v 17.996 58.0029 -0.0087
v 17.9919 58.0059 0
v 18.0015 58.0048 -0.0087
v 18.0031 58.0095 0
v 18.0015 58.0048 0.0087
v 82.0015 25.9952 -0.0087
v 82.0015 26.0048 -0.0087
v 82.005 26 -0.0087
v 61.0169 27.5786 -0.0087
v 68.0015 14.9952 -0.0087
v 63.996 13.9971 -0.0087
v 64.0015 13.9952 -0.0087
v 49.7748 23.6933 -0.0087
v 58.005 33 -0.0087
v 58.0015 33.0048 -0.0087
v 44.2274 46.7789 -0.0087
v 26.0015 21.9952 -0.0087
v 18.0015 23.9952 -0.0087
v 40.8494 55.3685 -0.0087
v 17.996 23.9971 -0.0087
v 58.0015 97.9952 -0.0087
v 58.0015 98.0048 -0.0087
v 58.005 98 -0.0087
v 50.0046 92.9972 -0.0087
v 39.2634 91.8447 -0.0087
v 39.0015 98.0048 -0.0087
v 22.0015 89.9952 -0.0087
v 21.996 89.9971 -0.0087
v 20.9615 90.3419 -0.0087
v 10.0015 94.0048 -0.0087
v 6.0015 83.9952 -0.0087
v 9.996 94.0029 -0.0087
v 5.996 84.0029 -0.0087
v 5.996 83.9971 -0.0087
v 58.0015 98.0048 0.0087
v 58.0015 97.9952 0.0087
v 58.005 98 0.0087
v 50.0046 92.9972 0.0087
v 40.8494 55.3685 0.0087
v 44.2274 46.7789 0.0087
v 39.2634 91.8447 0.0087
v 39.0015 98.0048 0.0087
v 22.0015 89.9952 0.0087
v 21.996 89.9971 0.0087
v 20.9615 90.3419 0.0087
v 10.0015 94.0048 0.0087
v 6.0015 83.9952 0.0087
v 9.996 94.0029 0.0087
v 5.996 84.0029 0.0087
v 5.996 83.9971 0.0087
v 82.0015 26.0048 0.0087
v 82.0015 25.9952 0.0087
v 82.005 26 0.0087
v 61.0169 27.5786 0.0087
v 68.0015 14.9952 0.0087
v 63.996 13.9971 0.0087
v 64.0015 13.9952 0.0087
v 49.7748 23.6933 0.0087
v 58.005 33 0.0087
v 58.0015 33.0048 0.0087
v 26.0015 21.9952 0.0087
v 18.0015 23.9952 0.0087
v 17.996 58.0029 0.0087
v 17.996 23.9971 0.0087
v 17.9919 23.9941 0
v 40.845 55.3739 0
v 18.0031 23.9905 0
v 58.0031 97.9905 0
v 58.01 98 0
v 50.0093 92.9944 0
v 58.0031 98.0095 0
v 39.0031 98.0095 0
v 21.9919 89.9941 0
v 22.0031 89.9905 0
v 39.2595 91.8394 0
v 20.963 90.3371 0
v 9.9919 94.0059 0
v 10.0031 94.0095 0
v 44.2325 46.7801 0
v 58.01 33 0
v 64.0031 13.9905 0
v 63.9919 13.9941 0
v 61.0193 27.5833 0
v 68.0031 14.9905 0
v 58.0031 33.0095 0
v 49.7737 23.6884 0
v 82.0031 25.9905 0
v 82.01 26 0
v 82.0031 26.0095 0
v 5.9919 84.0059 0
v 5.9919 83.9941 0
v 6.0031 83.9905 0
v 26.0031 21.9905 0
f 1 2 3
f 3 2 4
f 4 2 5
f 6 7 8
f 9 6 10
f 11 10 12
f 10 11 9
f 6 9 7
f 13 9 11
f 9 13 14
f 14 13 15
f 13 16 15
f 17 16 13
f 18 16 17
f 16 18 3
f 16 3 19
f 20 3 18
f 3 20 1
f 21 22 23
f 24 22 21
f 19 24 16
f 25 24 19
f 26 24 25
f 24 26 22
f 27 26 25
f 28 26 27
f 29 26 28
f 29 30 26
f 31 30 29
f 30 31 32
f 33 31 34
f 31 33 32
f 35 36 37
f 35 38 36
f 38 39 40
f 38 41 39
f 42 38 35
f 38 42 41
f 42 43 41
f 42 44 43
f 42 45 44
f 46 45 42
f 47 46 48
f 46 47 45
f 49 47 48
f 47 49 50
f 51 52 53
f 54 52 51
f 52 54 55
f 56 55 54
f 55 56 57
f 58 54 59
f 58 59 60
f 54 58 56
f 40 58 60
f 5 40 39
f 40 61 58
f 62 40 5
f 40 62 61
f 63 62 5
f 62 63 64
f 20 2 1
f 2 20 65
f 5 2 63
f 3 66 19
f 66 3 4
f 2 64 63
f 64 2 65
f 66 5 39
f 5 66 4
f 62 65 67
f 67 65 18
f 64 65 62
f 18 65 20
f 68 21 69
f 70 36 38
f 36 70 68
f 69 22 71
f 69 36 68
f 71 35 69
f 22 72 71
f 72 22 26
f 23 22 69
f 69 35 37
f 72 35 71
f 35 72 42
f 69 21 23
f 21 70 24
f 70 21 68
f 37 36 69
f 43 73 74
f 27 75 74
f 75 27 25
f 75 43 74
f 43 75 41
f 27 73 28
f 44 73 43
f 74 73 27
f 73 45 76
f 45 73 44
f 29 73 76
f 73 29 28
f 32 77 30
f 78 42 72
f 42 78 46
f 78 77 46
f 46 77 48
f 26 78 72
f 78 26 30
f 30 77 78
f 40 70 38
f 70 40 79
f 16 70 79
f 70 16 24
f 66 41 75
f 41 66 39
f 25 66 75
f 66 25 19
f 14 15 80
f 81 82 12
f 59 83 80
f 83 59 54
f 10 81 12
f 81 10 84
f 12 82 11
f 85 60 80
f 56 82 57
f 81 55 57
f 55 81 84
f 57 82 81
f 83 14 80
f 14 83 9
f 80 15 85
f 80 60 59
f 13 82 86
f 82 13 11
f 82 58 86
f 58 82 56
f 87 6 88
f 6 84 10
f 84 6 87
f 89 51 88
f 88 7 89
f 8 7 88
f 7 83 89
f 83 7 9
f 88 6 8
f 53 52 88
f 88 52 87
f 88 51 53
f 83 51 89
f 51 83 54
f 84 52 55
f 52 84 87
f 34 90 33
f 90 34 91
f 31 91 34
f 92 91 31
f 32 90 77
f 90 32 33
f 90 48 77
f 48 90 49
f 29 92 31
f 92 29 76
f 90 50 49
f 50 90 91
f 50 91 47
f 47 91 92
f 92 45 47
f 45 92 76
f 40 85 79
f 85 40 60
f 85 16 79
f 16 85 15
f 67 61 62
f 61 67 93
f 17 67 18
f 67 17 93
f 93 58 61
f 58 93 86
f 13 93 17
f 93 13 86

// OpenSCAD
color([0.3519350680925015,0.6477014615427978,0.14125726454845833]) hull(){
    translate([18,58]) sphere(0.01);
    translate([44,55]) sphere(0.01);
    translate([42,29]) sphere(0.01);
}
color([0.23013900541024712,0.8285218163248013,0.9603761550286747]) hull(){
    translate([18,58]) sphere(0.01);
    translate([44,55]) sphere(0.01);
    translate([44,47]) sphere(0.01);
}
color([0.6050710034948523,0.017553655236826726,0.43262871278032167]) hull(){
    translate([18,58]) sphere(0.01);
    translate([42,29]) sphere(0.01);
    translate([18,24]) sphere(0.01);
}
color([0.2571490251669072,0.4480229944680496,0.14517873337393172]) hull(){
    translate([18,58]) sphere(0.01);
    translate([42,29]) sphere(0.01);
    translate([44,47]) sphere(0.01);
}
color([0.8405131005933094,0.9776834869331054,0.10300019528175153]) hull(){
    translate([18,58]) sphere(0.01);
    translate([18,24]) sphere(0.01);
    translate([44,47]) sphere(0.01);
}
color([0.998153073210626,0.8535026464000083,0.6855970549077809]) hull(){
    translate([58,98]) sphere(0.01);
    translate([50,93]) sphere(0.01);
    translate([39,98]) sphere(0.01);
}
color([0.7995005100691247,0.34047238184459006,0.1286635278612125]) hull(){
    translate([22,90]) sphere(0.01);
    translate([50,93]) sphere(0.01);
    translate([39,98]) sphere(0.01);
}
color([0.6020598448119898,0.9167847797194366,0.02081986636819022]) hull(){
    translate([22,90]) sphere(0.01);
    translate([10,94]) sphere(0.01);
    translate([39,98]) sphere(0.01);
}
color([0.9135118305629362,0.3823609034395232,0.42581309278619206]) hull(){
    translate([50,93]) sphere(0.01);
    translate([44,55]) sphere(0.01);
    translate([42,29]) sphere(0.01);
}
color([0.08967296065919184,0.0016857337534631478,0.31287848776698257]) hull(){
    translate([50,93]) sphere(0.01);
    translate([42,29]) sphere(0.01);
    translate([39,98]) sphere(0.01);
}
color([0.09731792302828757,0.364404074066101,0.8754307508322564]) hull(){
    translate([44,55]) sphere(0.01);
    translate([42,29]) sphere(0.01);
    translate([44,47]) sphere(0.01);
}
color([0.6967090939923642,0.5776053806129825,0.18685318159950626]) hull(){
    translate([64,14]) sphere(0.01);
    translate([68,15]) sphere(0.01);
    translate([58,33]) sphere(0.01);
}
color([0.9585806736472646,0.593334846568766,0.09927504601217696]) hull(){
    translate([64,14]) sphere(0.01);
    translate([68,15]) sphere(0.01);
    translate([42,29]) sphere(0.01);
}
color([0.19313665173925,0.6863688301261038,0.2093263356404984]) hull(){
    translate([64,14]) sphere(0.01);
    translate([58,33]) sphere(0.01);
    translate([42,29]) sphere(0.01);
}
color([0.2694340379225941,0.24598969558588324,0.16092298384524362]) hull(){
    translate([68,15]) sphere(0.01);
    translate([82,26]) sphere(0.01);
    translate([42,29]) sphere(0.01);
}
color([0.5102606956149307,0.431705445139412,0.38909399282504675]) hull(){
    translate([68,15]) sphere(0.01);
    translate([42,29]) sphere(0.01);
    translate([44,47]) sphere(0.01);
}
color([0.3194819673674283,0.6655357355223767,0.22692357675811492]) hull(){
    translate([10,94]) sphere(0.01);
    translate([6,84]) sphere(0.01);
    translate([39,98]) sphere(0.01);
}
color([0.9464906820257937,0.35776616524050997,0.9421064453260054]) hull(){
    translate([58,33]) sphere(0.01);
    translate([42,29]) sphere(0.01);
    translate([26,22]) sphere(0.01);
}
color([0.3792404853118415,0.27508202782836655,0.9368074710650367]) hull(){
    translate([58,33]) sphere(0.01);
    translate([42,29]) sphere(0.01);
    translate([44,47]) sphere(0.01);
}
color([0.7670397757471089,0.17483880300164423,0.7474114244696689]) hull(){
    translate([58,33]) sphere(0.01);
    translate([26,22]) sphere(0.01);
    translate([18,24]) sphere(0.01);
}
color([0.6015236368594579,0.5872808850844162,0.28390336255679416]) hull(){
    translate([82,26]) sphere(0.01);
    translate([42,29]) sphere(0.01);
    translate([26,22]) sphere(0.01);
}
